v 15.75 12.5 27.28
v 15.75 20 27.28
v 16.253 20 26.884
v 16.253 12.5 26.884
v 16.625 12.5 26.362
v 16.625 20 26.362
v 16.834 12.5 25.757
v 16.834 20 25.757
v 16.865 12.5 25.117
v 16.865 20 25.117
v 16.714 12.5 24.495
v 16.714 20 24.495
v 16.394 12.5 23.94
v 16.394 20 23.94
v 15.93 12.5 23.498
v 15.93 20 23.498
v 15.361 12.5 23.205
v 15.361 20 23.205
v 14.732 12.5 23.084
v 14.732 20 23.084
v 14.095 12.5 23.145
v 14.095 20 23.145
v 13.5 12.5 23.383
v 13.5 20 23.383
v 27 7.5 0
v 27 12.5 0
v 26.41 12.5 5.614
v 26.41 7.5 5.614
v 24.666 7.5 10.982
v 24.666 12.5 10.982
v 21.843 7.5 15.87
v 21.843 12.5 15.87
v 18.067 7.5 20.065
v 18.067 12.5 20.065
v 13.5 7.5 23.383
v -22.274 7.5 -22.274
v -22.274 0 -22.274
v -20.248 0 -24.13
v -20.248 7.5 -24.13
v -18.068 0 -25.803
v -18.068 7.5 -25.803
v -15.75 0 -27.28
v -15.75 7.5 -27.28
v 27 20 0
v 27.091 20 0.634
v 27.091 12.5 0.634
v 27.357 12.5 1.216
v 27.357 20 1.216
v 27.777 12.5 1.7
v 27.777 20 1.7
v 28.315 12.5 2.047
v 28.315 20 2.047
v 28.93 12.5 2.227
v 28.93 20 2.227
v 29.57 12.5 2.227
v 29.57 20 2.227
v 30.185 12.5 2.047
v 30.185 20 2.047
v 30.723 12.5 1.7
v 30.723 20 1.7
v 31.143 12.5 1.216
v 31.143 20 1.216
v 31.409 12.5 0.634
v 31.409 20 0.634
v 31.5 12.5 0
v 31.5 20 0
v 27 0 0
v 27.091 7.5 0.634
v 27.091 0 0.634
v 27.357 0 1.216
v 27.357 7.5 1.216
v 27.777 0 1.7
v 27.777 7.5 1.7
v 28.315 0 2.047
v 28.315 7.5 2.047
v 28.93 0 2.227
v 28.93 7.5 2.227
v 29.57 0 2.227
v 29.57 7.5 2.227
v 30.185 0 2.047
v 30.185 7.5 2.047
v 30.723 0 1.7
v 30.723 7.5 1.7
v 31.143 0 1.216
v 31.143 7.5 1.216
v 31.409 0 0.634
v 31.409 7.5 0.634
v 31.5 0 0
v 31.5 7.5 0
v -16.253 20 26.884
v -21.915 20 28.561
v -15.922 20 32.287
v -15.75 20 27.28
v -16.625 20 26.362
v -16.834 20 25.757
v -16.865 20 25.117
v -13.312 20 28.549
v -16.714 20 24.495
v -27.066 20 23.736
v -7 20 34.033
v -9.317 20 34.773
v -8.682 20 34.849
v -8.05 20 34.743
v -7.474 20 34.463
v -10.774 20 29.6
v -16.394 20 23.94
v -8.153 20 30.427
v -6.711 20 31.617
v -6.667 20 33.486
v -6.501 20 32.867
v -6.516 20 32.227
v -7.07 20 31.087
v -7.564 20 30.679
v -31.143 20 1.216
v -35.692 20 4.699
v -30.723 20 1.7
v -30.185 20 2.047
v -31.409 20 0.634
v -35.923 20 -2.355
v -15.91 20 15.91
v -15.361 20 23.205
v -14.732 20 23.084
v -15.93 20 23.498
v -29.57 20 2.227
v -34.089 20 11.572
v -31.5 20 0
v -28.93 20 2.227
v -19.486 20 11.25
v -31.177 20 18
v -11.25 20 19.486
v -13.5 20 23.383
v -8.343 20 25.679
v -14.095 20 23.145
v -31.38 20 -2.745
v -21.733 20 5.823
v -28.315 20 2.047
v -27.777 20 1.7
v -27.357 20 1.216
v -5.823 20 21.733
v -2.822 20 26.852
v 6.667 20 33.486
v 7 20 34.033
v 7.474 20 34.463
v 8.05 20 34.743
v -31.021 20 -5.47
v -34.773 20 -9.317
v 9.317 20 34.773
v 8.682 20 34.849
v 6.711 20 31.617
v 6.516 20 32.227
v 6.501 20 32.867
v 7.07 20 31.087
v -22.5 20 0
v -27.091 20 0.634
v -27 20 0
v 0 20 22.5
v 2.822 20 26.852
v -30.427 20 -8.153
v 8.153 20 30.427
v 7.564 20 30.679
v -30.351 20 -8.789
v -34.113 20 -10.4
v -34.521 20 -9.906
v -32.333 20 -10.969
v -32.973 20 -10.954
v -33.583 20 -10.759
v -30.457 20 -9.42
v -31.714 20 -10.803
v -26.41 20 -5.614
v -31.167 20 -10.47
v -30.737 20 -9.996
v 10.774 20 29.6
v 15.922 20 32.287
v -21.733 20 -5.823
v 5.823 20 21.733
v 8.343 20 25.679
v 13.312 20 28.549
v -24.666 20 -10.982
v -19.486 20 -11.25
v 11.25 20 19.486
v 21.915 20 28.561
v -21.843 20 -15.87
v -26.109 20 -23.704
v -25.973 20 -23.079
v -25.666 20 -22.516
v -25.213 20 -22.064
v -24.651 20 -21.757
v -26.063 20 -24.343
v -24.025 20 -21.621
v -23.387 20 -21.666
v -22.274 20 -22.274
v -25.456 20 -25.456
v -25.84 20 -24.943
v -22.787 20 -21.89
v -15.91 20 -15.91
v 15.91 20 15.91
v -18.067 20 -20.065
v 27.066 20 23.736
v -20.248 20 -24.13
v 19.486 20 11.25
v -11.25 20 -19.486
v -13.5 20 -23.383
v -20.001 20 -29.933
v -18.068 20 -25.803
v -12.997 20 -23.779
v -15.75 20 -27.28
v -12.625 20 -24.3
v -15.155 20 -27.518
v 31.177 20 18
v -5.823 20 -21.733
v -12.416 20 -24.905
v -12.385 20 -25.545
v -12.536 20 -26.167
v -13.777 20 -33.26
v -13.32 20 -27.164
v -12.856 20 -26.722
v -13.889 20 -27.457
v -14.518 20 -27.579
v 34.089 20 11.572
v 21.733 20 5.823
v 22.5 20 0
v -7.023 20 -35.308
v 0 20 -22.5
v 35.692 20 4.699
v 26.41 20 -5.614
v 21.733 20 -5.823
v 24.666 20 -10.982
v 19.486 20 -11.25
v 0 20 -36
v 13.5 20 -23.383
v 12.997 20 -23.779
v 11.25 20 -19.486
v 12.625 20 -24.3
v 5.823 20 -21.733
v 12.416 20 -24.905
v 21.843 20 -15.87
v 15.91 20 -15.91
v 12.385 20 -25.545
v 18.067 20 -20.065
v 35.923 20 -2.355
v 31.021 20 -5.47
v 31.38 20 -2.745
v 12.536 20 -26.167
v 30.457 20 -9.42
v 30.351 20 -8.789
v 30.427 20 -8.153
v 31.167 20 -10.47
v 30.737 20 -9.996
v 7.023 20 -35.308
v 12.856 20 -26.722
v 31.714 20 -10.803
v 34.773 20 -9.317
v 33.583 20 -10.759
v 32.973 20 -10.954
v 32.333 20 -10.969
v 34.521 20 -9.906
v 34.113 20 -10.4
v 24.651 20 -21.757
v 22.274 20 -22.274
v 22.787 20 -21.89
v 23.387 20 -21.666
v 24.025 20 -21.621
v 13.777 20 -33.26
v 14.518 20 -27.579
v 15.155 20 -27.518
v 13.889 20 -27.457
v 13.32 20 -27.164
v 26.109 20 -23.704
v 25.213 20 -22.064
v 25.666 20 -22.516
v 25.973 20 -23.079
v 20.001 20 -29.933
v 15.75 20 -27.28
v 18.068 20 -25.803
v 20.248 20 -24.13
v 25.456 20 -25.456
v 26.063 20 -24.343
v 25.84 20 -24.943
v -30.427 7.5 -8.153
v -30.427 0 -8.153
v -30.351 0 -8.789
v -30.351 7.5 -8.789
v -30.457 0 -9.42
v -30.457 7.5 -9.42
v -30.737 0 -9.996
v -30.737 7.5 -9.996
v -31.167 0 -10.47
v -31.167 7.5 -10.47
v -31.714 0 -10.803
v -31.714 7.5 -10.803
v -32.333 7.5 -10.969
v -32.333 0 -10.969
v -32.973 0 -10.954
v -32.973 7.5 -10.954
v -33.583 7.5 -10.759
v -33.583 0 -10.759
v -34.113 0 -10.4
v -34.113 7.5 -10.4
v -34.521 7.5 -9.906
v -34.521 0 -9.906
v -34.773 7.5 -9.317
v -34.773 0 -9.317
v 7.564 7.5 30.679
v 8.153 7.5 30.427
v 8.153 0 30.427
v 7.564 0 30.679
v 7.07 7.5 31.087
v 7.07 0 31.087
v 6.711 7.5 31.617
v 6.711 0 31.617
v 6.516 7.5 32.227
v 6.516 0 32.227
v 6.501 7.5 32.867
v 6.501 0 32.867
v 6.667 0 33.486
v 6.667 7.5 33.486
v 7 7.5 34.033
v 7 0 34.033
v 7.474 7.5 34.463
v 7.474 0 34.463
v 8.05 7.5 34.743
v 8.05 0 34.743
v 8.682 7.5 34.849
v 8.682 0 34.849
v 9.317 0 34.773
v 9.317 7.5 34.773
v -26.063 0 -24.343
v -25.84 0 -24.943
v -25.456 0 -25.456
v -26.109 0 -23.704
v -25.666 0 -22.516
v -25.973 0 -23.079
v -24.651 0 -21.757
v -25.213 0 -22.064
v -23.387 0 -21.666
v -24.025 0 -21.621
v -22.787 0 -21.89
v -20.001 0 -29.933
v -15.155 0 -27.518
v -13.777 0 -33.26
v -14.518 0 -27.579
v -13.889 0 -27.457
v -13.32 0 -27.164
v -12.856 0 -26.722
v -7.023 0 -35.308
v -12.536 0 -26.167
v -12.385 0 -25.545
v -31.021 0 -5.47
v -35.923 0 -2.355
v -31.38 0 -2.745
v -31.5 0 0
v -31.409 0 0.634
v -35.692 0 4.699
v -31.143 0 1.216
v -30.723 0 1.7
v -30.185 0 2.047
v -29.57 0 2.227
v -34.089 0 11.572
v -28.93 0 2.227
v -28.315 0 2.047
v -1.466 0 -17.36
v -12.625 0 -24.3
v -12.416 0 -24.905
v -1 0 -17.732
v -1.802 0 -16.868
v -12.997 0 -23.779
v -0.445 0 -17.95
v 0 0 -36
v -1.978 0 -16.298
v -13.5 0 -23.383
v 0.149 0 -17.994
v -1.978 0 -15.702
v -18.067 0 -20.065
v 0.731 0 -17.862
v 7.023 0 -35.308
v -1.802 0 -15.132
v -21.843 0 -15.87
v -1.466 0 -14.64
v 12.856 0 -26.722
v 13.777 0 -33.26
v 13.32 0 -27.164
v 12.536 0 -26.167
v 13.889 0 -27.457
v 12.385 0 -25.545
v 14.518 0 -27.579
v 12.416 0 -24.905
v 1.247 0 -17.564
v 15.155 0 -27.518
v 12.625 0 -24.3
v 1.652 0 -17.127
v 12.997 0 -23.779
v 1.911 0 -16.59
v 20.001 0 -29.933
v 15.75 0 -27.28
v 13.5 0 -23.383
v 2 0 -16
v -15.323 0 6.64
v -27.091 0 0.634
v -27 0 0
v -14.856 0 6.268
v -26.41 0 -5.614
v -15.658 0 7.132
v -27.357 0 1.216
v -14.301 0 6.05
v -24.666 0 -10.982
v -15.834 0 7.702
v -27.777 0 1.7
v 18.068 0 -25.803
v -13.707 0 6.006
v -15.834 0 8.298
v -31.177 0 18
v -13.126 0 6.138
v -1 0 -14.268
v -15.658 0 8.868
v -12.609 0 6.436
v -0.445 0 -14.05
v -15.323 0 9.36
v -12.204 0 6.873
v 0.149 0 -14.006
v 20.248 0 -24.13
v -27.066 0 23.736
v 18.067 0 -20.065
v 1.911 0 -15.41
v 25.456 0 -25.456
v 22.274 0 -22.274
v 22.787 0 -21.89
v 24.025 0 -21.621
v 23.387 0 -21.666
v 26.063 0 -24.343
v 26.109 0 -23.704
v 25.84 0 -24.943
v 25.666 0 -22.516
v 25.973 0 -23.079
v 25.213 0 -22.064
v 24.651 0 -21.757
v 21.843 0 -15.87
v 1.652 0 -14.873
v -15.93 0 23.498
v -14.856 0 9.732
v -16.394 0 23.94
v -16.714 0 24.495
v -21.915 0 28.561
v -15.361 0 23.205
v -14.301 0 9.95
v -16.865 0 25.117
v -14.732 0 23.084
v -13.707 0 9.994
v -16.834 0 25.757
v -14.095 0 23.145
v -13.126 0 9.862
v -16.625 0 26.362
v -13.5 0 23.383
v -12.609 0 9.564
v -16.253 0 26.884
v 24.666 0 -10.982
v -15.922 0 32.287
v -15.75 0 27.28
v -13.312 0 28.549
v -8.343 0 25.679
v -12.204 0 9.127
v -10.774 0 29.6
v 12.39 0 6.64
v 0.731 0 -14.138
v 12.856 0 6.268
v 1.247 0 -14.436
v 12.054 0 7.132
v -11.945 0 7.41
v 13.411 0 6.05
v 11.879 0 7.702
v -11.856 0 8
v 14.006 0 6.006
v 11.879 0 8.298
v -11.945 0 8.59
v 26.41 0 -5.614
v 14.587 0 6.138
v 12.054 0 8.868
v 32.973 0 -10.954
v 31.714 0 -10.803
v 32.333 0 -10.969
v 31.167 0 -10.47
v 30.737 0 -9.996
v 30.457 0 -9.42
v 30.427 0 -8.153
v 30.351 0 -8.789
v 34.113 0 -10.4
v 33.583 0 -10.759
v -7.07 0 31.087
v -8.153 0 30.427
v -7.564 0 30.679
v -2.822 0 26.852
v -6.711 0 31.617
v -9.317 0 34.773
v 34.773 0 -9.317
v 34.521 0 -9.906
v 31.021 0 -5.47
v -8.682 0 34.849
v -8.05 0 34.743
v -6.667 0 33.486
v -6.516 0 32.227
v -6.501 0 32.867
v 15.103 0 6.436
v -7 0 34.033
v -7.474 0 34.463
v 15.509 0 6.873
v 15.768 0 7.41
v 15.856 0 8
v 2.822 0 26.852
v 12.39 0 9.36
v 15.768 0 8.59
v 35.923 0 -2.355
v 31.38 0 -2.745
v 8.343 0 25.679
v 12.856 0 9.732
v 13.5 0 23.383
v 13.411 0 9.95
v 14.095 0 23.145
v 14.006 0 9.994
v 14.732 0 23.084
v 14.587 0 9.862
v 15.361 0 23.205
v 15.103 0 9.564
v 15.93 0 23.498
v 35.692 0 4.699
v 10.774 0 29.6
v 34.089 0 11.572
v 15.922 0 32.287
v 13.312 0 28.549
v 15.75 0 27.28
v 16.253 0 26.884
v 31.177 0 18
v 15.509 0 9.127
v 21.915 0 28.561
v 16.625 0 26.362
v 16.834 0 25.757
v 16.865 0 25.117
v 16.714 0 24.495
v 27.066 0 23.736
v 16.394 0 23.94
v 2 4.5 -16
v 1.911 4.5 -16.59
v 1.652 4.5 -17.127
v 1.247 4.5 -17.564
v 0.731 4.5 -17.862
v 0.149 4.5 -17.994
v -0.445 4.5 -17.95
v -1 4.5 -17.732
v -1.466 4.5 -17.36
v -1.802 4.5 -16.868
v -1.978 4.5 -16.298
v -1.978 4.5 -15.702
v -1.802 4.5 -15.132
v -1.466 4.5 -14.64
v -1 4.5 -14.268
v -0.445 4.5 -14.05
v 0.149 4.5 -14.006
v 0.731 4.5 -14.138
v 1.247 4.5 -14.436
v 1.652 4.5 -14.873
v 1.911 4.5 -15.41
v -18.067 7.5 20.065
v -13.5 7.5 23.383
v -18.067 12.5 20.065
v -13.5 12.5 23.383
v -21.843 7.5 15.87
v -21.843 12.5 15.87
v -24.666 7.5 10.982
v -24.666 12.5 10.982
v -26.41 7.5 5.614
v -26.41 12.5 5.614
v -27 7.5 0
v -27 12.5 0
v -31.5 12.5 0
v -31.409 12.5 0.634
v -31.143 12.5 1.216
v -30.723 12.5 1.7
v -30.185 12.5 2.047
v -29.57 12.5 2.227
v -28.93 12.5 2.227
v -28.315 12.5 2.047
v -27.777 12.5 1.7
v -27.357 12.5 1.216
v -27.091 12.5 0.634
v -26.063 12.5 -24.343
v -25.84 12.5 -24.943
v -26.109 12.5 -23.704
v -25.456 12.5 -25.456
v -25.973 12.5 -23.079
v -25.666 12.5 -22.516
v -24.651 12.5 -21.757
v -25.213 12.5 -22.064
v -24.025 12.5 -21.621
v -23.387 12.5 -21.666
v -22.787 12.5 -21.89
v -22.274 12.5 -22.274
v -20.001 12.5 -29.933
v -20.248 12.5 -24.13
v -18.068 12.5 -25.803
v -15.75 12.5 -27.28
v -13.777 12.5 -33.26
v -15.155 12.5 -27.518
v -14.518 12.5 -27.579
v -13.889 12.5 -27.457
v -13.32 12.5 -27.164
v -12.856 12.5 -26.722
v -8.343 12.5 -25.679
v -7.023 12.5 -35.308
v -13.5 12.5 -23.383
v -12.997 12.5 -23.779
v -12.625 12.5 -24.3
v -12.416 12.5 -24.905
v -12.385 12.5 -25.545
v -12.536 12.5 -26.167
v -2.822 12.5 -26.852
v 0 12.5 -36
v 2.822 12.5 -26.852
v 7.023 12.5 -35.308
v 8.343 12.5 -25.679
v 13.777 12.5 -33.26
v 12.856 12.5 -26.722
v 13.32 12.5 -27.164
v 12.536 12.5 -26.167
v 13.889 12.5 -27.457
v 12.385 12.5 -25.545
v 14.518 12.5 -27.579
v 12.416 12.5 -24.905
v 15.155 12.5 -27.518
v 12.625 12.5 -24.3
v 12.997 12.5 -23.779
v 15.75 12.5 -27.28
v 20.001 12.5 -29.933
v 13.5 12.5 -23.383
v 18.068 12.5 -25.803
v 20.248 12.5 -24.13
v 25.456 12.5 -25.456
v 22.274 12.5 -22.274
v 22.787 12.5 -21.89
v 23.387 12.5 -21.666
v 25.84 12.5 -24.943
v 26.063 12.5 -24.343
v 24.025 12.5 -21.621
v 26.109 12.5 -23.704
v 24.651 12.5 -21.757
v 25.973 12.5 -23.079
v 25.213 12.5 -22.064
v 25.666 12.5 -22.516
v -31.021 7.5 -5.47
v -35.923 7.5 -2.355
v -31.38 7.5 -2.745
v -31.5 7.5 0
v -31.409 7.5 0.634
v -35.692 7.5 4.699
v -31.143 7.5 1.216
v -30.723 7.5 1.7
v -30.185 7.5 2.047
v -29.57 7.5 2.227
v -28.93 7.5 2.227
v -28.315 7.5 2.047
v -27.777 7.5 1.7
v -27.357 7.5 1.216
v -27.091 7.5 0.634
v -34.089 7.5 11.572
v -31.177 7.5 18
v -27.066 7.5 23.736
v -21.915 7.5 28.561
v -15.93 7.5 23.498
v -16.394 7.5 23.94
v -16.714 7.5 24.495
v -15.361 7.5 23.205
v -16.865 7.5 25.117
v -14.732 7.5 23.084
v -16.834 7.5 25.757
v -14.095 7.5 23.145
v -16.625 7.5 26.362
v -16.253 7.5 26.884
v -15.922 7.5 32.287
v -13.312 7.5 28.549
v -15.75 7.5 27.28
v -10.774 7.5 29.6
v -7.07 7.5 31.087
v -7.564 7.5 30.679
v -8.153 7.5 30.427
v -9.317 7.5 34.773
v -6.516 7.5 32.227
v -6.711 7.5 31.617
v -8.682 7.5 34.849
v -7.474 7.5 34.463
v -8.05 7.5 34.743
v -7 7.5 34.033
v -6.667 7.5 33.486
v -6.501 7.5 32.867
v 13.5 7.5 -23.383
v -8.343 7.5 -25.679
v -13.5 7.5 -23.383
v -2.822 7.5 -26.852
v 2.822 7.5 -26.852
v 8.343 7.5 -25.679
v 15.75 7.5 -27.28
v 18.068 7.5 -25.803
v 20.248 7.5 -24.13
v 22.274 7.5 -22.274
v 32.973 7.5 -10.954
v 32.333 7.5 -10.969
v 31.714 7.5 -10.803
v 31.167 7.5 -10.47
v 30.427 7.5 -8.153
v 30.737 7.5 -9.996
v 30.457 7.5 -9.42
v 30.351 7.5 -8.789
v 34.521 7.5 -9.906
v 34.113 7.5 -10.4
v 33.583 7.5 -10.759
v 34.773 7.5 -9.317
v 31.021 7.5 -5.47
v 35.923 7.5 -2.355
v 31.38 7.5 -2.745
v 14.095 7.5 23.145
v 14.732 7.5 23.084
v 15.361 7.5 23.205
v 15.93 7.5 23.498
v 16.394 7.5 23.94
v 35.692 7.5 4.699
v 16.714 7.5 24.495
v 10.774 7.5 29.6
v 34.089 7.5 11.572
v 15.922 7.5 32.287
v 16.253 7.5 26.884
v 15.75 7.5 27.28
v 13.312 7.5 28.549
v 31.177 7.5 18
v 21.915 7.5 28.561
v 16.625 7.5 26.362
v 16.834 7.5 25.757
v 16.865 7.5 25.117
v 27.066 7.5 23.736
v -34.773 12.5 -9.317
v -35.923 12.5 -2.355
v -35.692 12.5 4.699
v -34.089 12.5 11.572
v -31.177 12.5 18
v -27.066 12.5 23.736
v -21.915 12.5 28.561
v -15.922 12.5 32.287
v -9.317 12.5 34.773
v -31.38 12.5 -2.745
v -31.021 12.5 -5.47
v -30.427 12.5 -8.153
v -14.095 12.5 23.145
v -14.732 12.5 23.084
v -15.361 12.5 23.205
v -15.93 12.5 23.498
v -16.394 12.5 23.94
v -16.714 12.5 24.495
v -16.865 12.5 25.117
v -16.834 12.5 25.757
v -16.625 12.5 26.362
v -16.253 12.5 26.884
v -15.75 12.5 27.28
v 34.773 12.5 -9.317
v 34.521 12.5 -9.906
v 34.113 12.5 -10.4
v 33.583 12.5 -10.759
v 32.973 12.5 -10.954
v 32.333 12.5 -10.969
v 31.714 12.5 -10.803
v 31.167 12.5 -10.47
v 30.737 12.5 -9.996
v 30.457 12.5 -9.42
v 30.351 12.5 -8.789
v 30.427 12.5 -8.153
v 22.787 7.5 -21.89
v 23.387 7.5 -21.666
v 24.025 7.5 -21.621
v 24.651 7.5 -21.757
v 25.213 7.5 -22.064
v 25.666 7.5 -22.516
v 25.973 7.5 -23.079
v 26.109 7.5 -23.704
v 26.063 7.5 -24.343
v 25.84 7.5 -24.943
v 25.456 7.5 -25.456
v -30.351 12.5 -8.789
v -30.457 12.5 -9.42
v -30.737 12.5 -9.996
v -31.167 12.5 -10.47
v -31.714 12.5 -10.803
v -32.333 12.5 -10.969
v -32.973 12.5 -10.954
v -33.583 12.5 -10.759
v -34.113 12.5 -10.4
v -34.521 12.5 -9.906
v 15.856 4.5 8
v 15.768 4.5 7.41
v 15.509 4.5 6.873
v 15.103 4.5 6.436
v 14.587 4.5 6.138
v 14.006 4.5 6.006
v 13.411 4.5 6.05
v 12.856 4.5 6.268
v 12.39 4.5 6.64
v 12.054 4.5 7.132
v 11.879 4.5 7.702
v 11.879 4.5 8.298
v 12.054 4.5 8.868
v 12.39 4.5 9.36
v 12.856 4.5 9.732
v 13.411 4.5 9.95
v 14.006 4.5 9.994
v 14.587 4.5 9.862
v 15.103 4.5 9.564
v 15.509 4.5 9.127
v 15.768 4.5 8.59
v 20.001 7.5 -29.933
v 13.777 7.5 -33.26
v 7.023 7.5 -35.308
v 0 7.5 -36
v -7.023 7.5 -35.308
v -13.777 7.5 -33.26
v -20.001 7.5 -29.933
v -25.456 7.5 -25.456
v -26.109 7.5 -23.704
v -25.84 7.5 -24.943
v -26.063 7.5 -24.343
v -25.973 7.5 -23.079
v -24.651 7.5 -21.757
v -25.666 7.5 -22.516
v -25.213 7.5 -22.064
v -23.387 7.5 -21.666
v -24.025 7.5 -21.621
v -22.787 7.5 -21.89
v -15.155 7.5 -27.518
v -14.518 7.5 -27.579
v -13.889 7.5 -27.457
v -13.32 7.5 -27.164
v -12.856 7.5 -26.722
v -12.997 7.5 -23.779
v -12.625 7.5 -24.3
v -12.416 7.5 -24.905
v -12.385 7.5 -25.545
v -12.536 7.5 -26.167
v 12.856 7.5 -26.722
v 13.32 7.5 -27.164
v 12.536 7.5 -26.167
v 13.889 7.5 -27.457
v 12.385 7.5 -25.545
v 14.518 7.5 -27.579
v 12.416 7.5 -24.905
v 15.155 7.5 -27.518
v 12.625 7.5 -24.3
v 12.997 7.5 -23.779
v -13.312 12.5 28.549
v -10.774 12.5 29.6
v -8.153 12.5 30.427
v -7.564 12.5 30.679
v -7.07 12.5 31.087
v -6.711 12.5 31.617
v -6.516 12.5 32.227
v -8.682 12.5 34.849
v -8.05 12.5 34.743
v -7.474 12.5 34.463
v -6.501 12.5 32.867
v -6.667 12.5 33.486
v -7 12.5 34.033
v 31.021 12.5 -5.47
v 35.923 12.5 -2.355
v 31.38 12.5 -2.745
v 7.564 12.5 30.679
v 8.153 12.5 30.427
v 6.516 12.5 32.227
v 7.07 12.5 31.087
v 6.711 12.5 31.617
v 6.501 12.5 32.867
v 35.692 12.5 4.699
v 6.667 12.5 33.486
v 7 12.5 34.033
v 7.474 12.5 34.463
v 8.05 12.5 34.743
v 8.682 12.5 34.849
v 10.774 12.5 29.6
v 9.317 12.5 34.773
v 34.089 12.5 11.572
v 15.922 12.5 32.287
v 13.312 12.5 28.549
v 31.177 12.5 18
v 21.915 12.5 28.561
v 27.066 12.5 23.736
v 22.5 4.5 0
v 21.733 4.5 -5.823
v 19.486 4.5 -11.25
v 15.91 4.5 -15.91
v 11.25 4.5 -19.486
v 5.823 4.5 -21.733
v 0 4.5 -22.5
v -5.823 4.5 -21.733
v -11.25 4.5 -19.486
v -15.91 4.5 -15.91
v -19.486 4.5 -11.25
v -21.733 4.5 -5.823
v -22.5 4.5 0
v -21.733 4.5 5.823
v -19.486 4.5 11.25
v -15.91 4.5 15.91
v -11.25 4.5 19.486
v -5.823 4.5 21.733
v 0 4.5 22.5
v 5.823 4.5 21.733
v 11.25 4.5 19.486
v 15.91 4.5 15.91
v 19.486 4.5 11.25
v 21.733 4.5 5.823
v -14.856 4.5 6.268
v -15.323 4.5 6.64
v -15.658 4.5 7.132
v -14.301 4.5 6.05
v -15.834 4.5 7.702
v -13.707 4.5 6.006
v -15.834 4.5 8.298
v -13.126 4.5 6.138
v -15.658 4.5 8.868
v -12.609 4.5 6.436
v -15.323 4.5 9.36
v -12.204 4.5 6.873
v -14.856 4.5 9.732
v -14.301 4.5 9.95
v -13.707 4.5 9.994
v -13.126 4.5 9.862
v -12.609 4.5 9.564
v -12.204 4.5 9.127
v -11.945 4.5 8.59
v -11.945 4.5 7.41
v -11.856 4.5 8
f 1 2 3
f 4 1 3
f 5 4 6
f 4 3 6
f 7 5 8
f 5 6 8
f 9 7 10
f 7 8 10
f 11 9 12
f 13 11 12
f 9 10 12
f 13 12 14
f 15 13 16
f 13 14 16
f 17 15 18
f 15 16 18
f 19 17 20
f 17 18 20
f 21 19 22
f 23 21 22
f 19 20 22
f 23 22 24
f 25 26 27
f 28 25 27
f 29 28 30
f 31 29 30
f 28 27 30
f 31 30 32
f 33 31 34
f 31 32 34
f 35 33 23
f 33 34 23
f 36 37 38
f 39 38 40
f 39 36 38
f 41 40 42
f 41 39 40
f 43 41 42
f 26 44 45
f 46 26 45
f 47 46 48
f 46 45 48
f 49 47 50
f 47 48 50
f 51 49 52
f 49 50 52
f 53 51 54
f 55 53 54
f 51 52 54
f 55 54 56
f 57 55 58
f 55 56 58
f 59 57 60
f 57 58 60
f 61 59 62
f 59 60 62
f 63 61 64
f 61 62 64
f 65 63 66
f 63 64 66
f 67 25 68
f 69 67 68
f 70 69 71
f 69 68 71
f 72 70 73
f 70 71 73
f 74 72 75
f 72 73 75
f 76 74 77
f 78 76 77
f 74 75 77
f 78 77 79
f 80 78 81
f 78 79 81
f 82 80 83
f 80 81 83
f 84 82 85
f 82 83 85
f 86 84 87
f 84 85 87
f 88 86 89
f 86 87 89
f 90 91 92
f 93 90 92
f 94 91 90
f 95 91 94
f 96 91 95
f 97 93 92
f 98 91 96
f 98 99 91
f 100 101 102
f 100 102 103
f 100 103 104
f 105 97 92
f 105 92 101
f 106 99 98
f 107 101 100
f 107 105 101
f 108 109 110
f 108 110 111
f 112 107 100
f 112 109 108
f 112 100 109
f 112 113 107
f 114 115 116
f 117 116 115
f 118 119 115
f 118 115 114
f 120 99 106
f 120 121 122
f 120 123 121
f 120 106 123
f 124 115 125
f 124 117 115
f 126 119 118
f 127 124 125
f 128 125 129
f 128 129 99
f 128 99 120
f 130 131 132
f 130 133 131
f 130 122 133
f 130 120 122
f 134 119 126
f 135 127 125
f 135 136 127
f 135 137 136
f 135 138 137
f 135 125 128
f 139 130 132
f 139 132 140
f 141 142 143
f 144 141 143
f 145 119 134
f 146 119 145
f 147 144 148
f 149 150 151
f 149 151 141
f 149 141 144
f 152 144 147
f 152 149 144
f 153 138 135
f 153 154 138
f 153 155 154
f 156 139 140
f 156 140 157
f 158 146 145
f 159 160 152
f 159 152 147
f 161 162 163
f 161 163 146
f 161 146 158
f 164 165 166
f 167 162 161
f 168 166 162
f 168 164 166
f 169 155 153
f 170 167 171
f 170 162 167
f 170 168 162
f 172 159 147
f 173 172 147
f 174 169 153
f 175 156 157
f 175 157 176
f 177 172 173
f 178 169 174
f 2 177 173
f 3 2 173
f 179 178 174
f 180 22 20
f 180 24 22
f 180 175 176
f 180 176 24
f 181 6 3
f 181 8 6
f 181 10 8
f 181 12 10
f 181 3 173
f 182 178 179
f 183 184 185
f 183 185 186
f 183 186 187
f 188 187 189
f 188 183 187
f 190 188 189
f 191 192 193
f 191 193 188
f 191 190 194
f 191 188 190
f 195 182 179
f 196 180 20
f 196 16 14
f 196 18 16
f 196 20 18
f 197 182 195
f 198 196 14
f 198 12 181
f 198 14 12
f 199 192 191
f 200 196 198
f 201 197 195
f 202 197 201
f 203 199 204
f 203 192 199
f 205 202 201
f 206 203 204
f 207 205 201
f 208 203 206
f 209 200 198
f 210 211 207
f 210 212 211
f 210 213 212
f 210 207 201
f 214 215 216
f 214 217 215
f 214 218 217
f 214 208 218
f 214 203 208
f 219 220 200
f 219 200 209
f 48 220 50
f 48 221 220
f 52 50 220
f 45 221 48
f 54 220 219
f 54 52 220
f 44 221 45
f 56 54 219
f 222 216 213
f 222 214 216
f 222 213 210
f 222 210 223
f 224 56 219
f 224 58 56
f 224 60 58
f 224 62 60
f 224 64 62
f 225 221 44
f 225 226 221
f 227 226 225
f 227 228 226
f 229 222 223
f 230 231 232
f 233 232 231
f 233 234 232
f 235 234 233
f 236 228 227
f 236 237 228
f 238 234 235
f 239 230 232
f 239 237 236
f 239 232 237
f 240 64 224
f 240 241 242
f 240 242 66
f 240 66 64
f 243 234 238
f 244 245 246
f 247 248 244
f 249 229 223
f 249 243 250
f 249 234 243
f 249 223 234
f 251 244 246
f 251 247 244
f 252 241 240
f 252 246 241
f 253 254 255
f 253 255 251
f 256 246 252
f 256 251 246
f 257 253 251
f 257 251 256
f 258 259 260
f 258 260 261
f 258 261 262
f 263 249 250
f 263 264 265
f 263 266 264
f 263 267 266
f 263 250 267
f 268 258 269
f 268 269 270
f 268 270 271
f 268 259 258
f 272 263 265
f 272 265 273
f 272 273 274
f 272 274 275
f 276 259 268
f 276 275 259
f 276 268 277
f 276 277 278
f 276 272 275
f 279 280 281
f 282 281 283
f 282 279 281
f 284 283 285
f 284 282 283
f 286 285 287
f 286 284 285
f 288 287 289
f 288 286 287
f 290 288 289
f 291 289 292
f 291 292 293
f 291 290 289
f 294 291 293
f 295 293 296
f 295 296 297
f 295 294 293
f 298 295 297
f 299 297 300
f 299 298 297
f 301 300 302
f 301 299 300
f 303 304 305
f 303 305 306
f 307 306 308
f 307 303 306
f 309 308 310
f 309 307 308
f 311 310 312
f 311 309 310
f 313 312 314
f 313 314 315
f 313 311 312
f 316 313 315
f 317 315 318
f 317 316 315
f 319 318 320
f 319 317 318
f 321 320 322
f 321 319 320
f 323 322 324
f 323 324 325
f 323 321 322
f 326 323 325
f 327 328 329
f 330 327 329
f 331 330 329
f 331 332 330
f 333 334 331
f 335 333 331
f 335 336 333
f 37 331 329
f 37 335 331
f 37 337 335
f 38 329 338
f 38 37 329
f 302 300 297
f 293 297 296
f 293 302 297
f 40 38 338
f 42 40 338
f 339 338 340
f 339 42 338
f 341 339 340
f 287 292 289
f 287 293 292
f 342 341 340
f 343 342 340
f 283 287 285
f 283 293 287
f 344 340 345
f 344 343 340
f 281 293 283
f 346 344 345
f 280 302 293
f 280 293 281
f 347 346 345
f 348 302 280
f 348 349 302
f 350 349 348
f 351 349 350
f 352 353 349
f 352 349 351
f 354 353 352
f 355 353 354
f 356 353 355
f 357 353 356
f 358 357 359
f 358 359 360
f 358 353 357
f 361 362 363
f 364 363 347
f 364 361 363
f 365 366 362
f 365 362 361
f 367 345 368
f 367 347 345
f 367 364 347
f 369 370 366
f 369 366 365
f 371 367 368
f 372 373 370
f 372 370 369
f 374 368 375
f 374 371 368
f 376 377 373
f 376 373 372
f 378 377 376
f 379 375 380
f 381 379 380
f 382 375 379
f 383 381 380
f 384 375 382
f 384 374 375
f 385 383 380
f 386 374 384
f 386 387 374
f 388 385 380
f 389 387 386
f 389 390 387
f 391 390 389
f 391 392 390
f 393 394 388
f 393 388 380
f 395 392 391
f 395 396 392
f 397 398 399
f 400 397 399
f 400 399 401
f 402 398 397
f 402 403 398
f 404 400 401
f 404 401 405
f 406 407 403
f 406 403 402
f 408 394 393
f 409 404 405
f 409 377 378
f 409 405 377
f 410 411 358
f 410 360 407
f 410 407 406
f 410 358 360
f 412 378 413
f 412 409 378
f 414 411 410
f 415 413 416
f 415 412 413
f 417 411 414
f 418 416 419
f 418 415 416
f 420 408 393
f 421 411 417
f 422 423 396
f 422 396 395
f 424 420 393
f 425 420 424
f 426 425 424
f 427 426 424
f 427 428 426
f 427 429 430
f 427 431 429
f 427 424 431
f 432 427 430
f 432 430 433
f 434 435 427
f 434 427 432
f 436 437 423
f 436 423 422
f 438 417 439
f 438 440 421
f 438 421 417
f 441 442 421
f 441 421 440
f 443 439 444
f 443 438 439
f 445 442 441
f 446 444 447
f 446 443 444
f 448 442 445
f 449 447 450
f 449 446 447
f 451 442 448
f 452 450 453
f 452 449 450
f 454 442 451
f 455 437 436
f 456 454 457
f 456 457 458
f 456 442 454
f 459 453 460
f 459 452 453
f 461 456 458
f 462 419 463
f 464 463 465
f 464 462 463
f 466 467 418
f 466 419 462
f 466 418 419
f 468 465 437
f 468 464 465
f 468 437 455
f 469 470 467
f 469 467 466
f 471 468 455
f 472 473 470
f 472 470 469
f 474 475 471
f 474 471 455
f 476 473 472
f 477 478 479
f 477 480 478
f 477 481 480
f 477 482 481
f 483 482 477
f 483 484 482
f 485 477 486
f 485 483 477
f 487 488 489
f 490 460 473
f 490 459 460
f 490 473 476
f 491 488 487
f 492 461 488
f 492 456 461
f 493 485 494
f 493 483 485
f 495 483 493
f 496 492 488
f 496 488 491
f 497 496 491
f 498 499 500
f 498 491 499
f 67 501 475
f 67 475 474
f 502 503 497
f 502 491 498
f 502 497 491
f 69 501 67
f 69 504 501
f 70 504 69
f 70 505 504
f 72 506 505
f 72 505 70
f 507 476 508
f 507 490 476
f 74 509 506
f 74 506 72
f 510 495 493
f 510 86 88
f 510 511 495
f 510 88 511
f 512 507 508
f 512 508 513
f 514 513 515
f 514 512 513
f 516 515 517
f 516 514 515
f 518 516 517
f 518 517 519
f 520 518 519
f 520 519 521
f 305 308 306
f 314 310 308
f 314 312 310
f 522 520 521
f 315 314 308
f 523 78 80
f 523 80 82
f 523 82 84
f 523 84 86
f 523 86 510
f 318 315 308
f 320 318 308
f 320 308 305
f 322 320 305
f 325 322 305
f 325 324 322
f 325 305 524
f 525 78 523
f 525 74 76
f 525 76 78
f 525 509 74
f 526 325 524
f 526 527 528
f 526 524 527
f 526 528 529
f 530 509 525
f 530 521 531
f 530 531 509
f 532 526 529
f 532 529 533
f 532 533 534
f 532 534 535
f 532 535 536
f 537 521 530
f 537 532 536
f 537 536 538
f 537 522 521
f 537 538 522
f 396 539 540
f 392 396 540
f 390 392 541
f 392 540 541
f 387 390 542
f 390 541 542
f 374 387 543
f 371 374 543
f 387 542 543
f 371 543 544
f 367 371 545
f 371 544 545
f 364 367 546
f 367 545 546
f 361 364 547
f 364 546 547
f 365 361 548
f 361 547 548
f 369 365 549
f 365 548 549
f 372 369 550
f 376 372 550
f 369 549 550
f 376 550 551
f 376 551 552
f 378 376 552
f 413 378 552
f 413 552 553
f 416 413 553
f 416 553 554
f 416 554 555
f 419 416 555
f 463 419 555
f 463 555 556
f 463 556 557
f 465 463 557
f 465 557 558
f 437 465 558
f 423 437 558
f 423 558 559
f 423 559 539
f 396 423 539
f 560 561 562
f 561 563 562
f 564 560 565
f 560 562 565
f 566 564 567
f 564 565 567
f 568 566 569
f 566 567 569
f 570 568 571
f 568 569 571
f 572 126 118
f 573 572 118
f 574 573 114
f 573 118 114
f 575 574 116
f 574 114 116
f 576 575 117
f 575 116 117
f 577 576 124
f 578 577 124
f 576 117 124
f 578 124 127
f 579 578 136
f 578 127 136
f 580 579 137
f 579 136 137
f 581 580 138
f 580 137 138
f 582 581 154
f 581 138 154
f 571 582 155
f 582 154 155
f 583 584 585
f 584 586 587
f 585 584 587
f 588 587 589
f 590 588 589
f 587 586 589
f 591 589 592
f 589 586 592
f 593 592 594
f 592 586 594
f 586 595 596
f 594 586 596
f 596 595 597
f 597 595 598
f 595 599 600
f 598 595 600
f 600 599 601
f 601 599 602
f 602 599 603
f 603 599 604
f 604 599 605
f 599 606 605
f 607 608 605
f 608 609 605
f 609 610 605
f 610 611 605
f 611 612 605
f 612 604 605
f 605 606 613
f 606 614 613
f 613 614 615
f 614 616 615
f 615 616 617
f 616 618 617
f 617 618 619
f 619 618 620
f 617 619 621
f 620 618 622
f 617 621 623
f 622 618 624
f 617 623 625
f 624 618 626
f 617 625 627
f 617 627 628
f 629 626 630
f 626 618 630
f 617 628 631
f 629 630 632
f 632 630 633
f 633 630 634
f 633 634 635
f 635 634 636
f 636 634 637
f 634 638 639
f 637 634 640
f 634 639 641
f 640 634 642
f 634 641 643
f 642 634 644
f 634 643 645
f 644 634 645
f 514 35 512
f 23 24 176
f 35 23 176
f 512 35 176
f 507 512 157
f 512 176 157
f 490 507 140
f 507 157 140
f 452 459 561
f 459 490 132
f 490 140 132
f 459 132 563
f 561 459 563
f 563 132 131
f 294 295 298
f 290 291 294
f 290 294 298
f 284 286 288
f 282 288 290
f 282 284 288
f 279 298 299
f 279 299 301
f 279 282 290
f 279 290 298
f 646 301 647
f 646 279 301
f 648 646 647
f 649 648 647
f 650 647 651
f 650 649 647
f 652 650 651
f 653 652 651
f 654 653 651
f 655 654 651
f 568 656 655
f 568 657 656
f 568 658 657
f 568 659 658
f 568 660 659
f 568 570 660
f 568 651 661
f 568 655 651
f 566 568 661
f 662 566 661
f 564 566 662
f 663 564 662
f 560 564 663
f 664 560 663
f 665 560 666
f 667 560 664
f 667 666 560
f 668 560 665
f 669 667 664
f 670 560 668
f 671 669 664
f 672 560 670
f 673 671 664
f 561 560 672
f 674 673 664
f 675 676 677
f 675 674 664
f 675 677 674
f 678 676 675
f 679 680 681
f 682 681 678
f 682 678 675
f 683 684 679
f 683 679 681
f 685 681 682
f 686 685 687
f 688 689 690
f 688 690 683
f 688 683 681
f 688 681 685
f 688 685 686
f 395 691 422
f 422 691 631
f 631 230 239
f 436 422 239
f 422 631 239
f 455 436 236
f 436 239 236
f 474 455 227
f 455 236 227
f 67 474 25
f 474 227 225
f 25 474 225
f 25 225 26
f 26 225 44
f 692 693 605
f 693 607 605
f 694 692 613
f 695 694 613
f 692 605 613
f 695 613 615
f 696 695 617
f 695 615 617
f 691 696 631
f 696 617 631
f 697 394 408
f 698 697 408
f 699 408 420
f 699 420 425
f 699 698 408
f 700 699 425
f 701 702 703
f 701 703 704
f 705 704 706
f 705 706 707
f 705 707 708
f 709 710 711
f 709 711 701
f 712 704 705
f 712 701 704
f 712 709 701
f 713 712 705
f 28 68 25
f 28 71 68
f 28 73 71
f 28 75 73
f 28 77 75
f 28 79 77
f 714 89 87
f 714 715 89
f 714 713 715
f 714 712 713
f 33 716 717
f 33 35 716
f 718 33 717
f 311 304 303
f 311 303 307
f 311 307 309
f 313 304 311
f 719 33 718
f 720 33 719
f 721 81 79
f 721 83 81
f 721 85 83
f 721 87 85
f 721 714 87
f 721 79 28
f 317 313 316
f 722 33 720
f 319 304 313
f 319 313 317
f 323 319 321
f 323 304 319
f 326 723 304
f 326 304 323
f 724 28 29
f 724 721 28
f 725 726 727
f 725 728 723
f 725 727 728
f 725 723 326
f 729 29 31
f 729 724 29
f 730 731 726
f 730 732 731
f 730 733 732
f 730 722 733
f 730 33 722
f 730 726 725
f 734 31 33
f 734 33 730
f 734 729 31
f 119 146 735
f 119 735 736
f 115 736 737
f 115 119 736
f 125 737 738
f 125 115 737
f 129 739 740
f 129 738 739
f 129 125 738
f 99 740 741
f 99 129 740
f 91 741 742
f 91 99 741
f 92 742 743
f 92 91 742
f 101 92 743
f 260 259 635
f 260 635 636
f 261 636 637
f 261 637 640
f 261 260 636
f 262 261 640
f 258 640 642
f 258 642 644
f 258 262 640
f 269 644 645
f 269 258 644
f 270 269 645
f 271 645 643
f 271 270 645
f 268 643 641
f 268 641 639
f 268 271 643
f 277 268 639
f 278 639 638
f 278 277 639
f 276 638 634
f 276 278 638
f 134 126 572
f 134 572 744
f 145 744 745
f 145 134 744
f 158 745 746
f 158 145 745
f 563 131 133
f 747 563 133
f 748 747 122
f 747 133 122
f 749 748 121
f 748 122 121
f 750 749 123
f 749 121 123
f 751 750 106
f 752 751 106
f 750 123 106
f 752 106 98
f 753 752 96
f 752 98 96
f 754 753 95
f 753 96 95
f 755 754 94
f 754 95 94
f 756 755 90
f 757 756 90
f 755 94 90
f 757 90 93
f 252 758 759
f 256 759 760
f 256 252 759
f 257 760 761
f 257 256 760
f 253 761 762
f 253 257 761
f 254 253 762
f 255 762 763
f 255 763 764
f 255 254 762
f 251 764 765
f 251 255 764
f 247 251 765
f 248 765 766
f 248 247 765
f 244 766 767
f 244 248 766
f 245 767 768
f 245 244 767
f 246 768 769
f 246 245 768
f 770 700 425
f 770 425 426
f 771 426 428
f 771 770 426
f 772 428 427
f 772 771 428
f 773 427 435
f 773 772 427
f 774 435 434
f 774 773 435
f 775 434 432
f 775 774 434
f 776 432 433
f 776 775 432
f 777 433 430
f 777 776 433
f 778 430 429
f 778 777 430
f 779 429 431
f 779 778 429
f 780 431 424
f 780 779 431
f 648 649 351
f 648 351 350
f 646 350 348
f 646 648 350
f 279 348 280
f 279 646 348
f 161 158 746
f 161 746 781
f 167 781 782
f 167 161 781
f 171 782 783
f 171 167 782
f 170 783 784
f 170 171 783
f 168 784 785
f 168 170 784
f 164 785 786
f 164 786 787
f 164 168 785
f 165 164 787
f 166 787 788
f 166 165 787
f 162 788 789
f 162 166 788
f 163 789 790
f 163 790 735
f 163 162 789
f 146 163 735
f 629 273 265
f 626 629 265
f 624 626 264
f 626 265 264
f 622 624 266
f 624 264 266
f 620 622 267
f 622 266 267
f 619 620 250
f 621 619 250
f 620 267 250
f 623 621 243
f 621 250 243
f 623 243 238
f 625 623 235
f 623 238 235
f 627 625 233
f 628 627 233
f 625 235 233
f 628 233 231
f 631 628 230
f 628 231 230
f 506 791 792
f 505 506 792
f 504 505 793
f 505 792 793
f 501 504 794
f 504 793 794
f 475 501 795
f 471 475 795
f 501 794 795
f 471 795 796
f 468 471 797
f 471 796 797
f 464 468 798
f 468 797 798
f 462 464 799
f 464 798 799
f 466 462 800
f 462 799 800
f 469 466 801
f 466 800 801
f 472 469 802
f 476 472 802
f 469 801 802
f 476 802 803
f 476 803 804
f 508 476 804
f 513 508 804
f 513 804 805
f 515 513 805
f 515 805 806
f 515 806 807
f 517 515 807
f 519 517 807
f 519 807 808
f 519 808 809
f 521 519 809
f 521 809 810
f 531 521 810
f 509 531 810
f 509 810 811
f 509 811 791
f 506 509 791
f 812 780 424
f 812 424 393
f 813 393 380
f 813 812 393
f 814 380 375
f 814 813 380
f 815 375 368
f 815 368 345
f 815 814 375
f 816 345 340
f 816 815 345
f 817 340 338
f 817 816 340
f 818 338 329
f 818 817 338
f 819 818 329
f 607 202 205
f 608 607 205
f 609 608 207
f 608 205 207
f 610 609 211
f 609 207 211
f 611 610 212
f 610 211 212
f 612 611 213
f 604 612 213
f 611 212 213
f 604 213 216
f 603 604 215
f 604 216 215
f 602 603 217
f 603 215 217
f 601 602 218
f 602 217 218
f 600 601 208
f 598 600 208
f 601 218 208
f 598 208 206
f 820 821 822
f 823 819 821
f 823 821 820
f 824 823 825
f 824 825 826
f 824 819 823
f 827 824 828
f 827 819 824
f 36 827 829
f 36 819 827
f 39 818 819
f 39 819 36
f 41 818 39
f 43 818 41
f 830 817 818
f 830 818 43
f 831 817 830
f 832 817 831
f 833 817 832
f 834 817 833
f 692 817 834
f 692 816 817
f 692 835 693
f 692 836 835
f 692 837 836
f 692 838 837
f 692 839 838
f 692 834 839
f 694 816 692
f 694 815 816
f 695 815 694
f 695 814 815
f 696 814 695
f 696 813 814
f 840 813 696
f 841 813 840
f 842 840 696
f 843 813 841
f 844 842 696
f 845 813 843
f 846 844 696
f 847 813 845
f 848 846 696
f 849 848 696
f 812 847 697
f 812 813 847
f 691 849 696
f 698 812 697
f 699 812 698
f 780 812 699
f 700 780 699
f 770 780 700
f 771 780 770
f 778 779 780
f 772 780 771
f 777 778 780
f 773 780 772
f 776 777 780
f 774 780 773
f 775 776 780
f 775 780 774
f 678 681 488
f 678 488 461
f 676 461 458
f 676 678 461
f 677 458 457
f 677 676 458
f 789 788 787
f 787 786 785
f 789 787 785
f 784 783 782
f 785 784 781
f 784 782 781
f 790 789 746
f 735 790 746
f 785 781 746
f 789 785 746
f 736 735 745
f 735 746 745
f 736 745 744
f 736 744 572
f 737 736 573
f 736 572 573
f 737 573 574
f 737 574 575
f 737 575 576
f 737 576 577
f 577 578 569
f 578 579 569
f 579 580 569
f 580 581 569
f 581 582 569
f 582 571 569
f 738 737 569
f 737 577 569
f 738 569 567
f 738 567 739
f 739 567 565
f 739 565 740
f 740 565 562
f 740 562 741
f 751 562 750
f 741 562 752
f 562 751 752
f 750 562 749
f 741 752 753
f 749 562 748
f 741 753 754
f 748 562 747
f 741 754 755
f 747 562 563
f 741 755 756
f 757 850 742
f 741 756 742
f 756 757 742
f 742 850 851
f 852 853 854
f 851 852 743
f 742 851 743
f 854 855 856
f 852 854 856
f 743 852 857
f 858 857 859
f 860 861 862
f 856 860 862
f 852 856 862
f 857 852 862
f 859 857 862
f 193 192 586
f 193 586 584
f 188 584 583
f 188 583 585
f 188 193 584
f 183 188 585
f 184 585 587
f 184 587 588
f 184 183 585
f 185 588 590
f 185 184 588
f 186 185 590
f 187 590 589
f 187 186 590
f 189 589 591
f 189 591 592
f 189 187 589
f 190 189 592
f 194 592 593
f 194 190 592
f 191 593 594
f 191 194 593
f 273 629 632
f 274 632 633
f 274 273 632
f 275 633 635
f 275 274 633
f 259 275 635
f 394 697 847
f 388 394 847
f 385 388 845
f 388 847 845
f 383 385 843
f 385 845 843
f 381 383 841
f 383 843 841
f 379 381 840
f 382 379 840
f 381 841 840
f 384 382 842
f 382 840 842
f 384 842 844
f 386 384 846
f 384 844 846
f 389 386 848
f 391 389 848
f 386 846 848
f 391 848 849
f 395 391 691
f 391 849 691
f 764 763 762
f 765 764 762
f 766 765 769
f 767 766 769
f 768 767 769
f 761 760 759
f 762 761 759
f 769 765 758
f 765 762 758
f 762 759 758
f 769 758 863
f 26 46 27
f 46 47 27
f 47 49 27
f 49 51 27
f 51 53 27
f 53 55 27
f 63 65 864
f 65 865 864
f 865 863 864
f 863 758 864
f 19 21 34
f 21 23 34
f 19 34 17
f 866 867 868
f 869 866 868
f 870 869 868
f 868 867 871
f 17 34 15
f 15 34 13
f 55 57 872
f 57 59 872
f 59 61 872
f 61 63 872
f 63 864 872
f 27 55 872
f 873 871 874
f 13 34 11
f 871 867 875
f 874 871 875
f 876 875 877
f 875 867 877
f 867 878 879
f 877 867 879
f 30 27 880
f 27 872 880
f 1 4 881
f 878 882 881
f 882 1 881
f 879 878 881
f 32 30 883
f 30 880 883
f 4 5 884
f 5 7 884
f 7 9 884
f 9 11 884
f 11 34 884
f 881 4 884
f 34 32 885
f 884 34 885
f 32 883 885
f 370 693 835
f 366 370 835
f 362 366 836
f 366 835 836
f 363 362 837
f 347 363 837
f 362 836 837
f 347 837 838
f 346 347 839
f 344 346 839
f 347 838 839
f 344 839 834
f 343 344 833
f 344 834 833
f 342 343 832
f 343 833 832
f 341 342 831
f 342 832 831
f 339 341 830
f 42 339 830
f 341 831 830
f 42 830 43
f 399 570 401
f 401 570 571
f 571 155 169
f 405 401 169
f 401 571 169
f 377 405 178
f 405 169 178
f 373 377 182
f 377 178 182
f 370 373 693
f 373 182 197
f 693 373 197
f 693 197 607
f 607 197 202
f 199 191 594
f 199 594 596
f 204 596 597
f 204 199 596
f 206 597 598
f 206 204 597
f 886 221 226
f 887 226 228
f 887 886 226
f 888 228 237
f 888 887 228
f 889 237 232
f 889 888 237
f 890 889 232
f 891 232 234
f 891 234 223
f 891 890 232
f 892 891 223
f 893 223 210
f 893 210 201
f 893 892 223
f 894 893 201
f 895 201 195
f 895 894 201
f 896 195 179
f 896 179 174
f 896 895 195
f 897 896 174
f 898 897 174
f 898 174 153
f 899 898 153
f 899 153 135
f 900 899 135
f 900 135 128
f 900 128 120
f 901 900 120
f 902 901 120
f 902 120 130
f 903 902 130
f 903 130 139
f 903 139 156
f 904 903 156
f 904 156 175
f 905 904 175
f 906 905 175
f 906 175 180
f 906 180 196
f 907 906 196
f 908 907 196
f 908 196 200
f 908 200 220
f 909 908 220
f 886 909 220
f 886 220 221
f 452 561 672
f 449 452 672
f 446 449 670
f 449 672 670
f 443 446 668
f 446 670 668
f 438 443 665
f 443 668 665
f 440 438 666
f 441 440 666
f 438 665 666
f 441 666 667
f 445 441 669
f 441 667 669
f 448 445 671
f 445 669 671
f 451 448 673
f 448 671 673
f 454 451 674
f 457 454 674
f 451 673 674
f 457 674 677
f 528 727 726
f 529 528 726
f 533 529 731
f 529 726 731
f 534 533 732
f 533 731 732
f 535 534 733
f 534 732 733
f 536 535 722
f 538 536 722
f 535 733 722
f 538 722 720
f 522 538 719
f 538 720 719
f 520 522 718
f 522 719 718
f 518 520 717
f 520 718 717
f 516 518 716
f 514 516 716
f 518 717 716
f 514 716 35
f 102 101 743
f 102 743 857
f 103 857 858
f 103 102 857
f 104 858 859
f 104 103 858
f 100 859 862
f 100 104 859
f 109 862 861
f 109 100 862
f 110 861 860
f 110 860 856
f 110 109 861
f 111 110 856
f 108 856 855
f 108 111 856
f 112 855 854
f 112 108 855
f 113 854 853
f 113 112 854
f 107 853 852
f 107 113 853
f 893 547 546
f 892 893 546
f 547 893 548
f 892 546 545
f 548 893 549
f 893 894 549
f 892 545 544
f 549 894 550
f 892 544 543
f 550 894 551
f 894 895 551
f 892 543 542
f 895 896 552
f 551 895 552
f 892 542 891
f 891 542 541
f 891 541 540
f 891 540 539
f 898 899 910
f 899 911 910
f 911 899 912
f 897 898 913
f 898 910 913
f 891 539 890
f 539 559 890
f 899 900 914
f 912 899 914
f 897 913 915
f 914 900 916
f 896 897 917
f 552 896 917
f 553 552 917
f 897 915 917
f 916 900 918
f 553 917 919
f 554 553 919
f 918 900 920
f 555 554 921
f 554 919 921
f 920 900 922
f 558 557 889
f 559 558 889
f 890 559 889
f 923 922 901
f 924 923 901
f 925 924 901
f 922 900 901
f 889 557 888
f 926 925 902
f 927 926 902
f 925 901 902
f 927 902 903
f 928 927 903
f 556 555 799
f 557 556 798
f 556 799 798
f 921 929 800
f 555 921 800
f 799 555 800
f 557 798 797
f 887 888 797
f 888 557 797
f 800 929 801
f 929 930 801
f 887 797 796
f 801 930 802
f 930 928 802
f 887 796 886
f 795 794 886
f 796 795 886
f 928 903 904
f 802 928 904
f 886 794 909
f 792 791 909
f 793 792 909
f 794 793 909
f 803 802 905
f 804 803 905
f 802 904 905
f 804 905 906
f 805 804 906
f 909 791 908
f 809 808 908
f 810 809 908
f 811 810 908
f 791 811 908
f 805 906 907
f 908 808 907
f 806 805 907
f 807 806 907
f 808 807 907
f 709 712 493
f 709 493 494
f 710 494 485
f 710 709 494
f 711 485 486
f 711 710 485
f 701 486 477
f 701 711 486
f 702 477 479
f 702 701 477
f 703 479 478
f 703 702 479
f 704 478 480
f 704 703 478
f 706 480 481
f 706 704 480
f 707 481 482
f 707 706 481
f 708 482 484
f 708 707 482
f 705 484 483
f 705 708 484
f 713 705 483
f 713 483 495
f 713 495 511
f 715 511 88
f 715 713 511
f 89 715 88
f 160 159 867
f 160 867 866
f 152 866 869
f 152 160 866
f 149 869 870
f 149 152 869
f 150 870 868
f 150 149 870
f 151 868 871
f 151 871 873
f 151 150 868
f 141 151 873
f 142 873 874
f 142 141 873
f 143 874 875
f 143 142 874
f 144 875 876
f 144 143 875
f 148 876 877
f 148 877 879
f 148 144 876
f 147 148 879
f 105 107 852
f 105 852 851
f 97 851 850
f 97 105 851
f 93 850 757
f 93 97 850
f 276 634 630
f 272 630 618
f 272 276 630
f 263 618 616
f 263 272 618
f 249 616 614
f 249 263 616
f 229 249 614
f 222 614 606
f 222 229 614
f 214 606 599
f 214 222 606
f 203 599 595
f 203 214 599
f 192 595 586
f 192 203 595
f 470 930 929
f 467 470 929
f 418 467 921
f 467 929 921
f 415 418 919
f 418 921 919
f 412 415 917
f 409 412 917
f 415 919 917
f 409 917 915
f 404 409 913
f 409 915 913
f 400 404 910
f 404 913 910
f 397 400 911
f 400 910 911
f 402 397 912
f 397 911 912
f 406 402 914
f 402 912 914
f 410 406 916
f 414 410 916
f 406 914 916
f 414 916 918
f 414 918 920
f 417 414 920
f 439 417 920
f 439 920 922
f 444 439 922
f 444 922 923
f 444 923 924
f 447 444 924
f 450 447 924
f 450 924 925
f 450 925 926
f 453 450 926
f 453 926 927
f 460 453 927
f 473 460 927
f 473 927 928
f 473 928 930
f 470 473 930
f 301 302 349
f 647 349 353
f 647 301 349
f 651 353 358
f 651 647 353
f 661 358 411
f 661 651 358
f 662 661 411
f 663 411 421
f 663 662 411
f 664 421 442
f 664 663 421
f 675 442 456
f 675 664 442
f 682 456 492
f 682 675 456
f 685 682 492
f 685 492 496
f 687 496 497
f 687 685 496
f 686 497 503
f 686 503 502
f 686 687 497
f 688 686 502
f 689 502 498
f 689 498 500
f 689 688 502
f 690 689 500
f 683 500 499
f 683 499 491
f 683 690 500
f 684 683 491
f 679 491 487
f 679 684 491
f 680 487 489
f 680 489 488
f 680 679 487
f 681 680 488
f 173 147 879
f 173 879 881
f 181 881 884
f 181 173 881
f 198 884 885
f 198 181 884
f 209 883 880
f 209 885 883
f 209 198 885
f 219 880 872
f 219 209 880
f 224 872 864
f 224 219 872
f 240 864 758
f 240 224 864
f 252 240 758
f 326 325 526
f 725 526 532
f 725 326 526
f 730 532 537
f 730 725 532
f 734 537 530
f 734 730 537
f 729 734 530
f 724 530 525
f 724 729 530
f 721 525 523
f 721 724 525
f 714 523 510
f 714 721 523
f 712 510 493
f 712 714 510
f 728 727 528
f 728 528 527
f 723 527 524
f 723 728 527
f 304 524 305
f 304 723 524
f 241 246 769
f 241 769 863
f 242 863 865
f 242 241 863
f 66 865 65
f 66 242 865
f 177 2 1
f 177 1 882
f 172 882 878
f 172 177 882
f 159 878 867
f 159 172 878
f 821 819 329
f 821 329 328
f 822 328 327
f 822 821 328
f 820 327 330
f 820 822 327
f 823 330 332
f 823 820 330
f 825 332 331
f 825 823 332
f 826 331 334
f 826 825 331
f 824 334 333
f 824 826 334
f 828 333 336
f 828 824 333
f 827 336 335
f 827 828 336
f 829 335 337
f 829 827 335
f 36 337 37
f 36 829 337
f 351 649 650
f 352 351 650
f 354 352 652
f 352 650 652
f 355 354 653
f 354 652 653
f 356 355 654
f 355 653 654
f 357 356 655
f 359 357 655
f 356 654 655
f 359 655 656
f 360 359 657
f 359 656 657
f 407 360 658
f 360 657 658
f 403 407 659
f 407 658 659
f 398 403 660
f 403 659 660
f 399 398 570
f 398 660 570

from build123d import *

# Parameters (mm, degrees)
ESQUISSE1_R             = 31.5
ESQUISSE1_R_2           = 22.5
BOSS_EXTRU_1_DEPTH      = 20
ENL_V_MAT_EXTRU_1_DEPTH = 21
BOSS_EXTRU_2_DEPTH      = 20
ESQUISSE4_R             = 22.5
BOSS_EXTRU_3_DEPTH      = 4.5
ENL_V_MAT_EXTRU_2_REACH = 6.5
ESQUISSE5_R             = 2
ESQUISSE6_W             = 9
ESQUISSE6_H             = 5


with BuildPart() as part:
    # Esquisse1 → Boss.-Extru.1 (new body)
    with BuildSketch(Plane(origin=(0, 0, 0), x_dir=(1, 0, 0), z_dir=(0, 1, 0))):
        Circle(ESQUISSE1_R)
        Circle(ESQUISSE1_R_2, mode=Mode.SUBTRACT)
    extrude(amount=BOSS_EXTRU_1_DEPTH)

    # Esquisse2 → Enlèv. mat.-Extru.1 (cut, through all)
    with BuildSketch(Plane(origin=(0, 20, 0), x_dir=(1, 0, 0), z_dir=(0, 1, 0))):
        with BuildLine():
            ThreePointArc((-15.75, 27.279800219), (-27.279800219, 15.75), (-31.5, 0))
            ThreePointArc((-31.5, 0), (-29.25, -2.25), (-27, 0))
            ThreePointArc((-27, 0), (-23.382685902, 13.5), (-13.5, 23.382685902))
            ThreePointArc((-13.5, 23.382685902), (-12.676442841, 26.456243061), (-15.75, 27.279800219))
        make_face()
        with BuildLine():
            ThreePointArc((31.5, 0), (27.279800219, 15.75), (15.75, 27.279800219))
            ThreePointArc((15.75, 27.279800219), (12.676442841, 26.456243061), (13.5, 23.382685902))
            ThreePointArc((13.5, 23.382685902), (23.382685902, 13.5), (27, 0))
            ThreePointArc((27, 0), (29.25, -2.25), (31.5, 0))
        make_face()
        with BuildLine():
            ThreePointArc((-15.75, -27.279800219), (0, -31.5), (15.75, -27.279800219))
            ThreePointArc((15.75, -27.279800219), (16.573557159, -24.206243061), (13.5, -23.382685902))
            ThreePointArc((13.5, -23.382685902), (0, -27), (-13.5, -23.382685902))
            ThreePointArc((-13.5, -23.382685902), (-16.573557159, -24.206243061), (-15.75, -27.279800219))
        make_face()
    extrude(amount=-ENL_V_MAT_EXTRU_1_DEPTH, mode=Mode.SUBTRACT)

    # Esquisse3 → Boss.-Extru.2 (add)
    with BuildSketch(Plane(origin=(0, 20, 0), x_dir=(1, 0, 0), z_dir=(0, 1, 0))):
        with BuildLine():
            ThreePointArc((25.455844123, 25.455844123), (0, 36), (-25.455844123, 25.455844123))
            ThreePointArc((-25.455844123, 25.455844123), (-25.455844123, 22.273863607), (-22.273863607, 22.273863607))
            ThreePointArc((-22.273863607, 22.273863607), (0, 31.5), (22.273863607, 22.273863607))
            ThreePointArc((22.273863607, 22.273863607), (25.455844123, 22.273863607), (25.455844123, 25.455844123))
        make_face()
        with BuildLine():
            ThreePointArc((9.317485624, -34.773329746), (31.176914536, -18), (34.773329746, 9.317485624))
            ThreePointArc((34.773329746, 9.317485624), (32.017653786, 10.908475881), (30.426663528, 8.152799921))
            ThreePointArc((30.426663528, 8.152799921), (27.279800219, -15.75), (8.152799921, -30.426663528))
            ThreePointArc((8.152799921, -30.426663528), (6.561809663, -33.182339489), (9.317485624, -34.773329746))
        make_face()
        with BuildLine():
            ThreePointArc((-34.773329746, 9.317485624), (-31.176914536, -18), (-9.317485624, -34.773329746))
            ThreePointArc((-9.317485624, -34.773329746), (-6.561809663, -33.182339489), (-8.152799921, -30.426663528))
            ThreePointArc((-8.152799921, -30.426663528), (-27.279800219, -15.75), (-30.426663528, 8.152799921))
            ThreePointArc((-30.426663528, 8.152799921), (-32.017653786, 10.908475881), (-34.773329746, 9.317485624))
        make_face()
    extrude(amount=-BOSS_EXTRU_2_DEPTH)

    # Esquisse4 → Boss.-Extru.3 (add)
    with BuildSketch(Plane.XZ):
        Circle(ESQUISSE4_R)
    extrude(amount=-BOSS_EXTRU_3_DEPTH)

    # Esquisse5 → Enlèv. mat.-Extru.2 (cut, up to next)
    with BuildSketch(Plane(origin=(0, 4.5, 0), x_dir=(1, 0, 0), z_dir=(0, 1, 0)), mode=Mode.PRIVATE) as enl_v_mat_extru_2_sk1:
        with Locations((0, 16)):
            Circle(ESQUISSE5_R)
    enl_v_mat_extru_2_tool1 = extrude(enl_v_mat_extru_2_sk1.sketch, amount=-ENL_V_MAT_EXTRU_2_REACH, mode=Mode.PRIVATE) & part.part
    add(enl_v_mat_extru_2_tool1.solids().sort_by_distance((0, 4.5, -16))[0], mode=Mode.SUBTRACT)
    # Esquisse5 → Enlèv. mat.-Extru.2 (cut, up to next)
    with BuildSketch(Plane(origin=(0, 4.5, 0), x_dir=(1, 0, 0), z_dir=(0, 1, 0)), mode=Mode.PRIVATE) as enl_v_mat_extru_2_sk2:
        with Locations((13.856406461, -8)):
            Circle(ESQUISSE5_R)
    enl_v_mat_extru_2_tool2 = extrude(enl_v_mat_extru_2_sk2.sketch, amount=-ENL_V_MAT_EXTRU_2_REACH, mode=Mode.PRIVATE) & part.part
    add(enl_v_mat_extru_2_tool2.solids().sort_by_distance((13.856406, 4.5, 8))[0], mode=Mode.SUBTRACT)
    # Esquisse5 → Enlèv. mat.-Extru.2 (cut, up to next)
    with BuildSketch(Plane(origin=(0, 4.5, 0), x_dir=(1, 0, 0), z_dir=(0, 1, 0)), mode=Mode.PRIVATE) as enl_v_mat_extru_2_sk3:
        with Locations((-13.856406461, -8)):
            Circle(ESQUISSE5_R)
    enl_v_mat_extru_2_tool3 = extrude(enl_v_mat_extru_2_sk3.sketch, amount=-ENL_V_MAT_EXTRU_2_REACH, mode=Mode.PRIVATE) & part.part
    add(enl_v_mat_extru_2_tool3.solids().sort_by_distance((-13.856406, 4.5, 8))[0], mode=Mode.SUBTRACT)

    # Esquisse6 → Enlèvement de matière-Révolution1 (revolve, cut)
    with BuildSketch(Plane(origin=(0, 0, 0), x_dir=(0, 0, -1), z_dir=(1, 0, 0))):
        with Locations((31.5, 10)):
            Rectangle(ESQUISSE6_W, ESQUISSE6_H)
    revolve(axis=Axis((0, 10, 0), (0, -1, 0)), mode=Mode.SUBTRACT)


solid = part.part
